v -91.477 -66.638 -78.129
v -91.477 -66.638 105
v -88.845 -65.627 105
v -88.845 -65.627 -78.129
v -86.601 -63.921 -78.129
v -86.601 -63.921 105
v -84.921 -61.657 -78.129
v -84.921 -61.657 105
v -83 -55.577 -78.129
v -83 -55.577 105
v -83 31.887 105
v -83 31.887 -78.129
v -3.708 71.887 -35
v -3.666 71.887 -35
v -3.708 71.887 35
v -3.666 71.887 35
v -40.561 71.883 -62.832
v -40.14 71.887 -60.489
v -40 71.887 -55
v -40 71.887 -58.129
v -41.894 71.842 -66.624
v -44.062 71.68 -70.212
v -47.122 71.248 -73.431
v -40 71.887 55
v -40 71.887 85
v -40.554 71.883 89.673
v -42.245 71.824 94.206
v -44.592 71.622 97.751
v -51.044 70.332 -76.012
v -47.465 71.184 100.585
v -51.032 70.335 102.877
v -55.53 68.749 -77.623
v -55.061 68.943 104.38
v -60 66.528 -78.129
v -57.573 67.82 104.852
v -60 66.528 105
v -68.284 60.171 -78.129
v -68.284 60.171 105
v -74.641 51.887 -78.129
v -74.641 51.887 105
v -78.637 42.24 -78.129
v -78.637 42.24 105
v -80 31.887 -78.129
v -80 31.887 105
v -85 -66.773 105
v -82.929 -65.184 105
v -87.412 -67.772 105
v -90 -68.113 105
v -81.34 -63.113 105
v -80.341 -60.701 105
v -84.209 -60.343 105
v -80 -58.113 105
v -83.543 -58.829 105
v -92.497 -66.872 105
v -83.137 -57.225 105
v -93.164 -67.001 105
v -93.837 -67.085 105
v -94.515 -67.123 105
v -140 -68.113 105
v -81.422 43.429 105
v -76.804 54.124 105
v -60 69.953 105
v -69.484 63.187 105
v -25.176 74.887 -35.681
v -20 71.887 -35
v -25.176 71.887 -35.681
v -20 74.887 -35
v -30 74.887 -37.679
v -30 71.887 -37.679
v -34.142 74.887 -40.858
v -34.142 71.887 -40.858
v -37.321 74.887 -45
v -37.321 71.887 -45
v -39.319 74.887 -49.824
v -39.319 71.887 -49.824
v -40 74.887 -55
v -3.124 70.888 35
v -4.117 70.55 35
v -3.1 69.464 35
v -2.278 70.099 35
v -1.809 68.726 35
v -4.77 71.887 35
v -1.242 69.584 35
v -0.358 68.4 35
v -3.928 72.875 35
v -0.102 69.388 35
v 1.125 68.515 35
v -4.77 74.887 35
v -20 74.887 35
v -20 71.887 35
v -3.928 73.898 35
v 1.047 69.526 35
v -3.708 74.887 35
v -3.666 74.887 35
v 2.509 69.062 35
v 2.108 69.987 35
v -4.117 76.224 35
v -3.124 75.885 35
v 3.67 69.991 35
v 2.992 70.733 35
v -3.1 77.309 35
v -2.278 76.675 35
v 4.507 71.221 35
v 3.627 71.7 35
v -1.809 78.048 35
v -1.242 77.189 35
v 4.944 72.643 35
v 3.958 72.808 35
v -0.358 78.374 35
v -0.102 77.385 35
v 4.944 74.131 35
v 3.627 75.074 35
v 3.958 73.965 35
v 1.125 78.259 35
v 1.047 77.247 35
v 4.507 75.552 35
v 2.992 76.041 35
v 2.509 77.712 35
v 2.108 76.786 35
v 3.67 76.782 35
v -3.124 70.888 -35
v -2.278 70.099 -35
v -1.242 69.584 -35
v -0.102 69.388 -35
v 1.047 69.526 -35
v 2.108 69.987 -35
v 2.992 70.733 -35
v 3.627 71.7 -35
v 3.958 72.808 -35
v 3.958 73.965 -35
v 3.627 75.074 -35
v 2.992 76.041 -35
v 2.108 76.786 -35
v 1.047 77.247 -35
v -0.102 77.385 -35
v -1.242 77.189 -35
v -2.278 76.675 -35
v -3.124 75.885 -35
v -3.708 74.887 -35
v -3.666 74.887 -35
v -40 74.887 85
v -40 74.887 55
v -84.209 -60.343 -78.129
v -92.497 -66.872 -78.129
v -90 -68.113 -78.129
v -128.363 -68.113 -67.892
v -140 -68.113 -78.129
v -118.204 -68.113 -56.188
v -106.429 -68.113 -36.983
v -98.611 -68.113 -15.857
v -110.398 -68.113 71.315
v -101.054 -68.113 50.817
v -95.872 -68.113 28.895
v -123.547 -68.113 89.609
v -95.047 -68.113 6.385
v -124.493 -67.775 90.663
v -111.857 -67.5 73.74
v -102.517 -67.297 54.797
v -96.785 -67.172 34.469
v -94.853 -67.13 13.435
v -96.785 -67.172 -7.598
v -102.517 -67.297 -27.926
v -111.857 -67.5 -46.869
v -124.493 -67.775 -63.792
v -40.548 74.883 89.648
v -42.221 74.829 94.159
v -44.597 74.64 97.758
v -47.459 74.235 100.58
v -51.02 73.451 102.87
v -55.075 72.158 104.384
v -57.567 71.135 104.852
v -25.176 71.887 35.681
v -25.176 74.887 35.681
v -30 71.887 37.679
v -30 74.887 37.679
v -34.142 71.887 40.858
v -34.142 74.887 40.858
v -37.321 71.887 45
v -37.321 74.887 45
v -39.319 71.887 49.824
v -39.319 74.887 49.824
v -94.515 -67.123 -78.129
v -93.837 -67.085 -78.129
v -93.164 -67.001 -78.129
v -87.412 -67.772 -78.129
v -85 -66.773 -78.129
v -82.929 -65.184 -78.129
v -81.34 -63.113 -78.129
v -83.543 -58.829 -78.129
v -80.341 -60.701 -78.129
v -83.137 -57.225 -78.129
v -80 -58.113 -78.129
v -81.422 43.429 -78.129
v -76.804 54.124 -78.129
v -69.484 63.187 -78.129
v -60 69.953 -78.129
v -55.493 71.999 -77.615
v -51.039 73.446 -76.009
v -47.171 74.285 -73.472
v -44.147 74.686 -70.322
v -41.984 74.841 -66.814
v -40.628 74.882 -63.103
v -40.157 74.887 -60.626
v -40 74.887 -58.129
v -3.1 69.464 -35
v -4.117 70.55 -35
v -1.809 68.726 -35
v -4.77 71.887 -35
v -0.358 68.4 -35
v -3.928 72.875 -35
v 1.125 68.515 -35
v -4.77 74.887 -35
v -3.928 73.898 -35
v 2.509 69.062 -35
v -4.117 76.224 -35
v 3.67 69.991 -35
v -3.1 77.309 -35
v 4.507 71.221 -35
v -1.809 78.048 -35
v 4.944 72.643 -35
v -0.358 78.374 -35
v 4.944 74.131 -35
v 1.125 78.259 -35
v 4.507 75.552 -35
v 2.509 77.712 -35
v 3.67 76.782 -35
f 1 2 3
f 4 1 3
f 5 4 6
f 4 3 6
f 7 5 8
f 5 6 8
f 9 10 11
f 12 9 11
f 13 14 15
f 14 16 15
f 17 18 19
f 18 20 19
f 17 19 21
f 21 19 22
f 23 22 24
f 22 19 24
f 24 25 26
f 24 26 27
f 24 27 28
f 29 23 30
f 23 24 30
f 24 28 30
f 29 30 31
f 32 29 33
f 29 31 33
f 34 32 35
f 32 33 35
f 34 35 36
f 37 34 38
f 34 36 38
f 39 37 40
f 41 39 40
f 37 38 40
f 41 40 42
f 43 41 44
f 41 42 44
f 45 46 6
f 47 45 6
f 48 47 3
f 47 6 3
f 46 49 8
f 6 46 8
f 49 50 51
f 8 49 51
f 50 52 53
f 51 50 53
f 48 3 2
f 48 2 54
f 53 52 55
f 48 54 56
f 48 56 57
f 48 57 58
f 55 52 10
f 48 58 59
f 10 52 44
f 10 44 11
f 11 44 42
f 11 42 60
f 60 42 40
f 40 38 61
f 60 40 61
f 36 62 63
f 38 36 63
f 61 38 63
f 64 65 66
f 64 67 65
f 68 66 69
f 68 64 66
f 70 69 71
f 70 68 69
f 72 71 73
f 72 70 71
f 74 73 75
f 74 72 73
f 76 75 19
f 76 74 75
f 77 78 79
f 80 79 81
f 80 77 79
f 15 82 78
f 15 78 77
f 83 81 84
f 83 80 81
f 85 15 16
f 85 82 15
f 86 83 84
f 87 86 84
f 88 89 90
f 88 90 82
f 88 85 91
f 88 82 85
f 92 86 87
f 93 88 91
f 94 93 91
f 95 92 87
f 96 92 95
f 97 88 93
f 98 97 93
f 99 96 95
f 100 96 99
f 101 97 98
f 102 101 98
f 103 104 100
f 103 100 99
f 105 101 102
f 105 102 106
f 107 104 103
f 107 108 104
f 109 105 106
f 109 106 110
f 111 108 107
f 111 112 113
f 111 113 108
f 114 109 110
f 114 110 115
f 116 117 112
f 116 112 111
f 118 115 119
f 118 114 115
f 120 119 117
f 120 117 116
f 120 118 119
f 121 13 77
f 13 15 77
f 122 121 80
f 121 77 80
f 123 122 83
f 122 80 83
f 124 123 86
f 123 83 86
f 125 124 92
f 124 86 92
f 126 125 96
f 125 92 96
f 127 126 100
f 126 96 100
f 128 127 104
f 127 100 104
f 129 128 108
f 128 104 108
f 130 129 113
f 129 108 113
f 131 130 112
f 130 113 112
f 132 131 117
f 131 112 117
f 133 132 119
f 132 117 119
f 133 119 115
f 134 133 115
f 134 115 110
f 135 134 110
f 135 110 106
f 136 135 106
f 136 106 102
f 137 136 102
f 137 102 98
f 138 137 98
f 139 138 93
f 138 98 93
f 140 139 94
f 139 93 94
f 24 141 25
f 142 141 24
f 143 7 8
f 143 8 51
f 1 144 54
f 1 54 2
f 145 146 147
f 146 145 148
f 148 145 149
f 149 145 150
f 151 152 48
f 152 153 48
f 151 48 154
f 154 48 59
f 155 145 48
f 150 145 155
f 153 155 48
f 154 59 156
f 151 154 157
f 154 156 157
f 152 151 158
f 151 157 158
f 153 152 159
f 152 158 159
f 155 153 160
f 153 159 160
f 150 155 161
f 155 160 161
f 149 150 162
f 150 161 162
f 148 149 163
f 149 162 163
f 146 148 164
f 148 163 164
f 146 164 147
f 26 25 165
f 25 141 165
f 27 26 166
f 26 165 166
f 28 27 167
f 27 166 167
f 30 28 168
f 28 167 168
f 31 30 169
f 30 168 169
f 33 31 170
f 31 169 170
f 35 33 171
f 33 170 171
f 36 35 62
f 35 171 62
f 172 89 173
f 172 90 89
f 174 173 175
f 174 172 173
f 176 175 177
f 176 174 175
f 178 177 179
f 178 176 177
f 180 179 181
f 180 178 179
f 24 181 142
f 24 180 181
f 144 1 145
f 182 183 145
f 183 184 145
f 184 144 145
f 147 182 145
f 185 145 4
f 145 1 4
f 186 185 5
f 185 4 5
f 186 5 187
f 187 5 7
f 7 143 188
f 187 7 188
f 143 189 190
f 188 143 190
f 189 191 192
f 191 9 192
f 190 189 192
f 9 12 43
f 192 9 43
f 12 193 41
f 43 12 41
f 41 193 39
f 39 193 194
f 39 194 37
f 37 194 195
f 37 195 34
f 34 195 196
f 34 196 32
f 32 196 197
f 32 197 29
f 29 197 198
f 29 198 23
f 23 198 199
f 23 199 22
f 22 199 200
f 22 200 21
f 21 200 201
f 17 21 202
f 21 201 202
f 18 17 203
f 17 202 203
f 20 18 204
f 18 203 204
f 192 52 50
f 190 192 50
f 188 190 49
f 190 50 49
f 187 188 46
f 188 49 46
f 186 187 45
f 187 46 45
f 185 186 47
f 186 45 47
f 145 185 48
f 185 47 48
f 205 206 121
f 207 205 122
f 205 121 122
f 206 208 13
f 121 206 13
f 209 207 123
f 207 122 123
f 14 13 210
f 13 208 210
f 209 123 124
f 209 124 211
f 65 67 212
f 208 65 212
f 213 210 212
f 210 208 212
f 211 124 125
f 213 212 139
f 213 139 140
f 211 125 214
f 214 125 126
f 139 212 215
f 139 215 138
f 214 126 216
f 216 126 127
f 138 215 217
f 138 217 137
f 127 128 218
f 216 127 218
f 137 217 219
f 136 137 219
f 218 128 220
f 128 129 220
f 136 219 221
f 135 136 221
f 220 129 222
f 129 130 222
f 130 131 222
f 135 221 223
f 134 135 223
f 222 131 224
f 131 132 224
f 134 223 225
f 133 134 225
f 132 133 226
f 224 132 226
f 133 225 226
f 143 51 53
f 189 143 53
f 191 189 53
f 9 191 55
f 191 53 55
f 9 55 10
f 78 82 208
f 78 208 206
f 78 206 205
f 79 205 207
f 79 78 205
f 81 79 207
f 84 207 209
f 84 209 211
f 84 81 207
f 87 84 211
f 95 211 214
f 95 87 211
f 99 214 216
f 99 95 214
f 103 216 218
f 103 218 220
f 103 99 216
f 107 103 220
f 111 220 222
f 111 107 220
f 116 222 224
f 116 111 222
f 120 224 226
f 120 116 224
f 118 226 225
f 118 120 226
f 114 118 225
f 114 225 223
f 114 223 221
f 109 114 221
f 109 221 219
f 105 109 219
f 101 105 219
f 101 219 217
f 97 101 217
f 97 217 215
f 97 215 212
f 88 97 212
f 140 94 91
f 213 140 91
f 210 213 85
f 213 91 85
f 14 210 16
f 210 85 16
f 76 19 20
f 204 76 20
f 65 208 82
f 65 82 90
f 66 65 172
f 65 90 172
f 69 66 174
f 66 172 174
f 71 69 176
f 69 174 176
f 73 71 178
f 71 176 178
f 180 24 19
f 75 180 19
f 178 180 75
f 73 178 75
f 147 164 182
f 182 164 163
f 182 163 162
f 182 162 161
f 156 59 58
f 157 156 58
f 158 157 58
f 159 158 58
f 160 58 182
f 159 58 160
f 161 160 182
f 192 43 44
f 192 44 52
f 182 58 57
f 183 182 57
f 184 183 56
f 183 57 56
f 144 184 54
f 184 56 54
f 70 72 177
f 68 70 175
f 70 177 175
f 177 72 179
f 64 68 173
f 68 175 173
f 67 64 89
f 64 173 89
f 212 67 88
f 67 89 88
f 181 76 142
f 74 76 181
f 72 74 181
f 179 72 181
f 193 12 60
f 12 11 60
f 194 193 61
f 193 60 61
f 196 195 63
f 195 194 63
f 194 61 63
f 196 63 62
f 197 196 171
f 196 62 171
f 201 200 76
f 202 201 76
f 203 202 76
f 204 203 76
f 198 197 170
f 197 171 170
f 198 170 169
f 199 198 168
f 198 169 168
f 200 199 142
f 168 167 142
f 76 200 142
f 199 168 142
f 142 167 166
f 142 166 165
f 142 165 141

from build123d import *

# Parameters (mm, degrees)
BOSS_EXTRUDE2_DEPTH = 105
SKETCH2_W           = 40
SKETCH2_H           = 70
CUT_EXTRUDE1_DEPTH  = 105
FILLET1_R           = 20
FILLET2_R           = 20
SKETCH3_R           = 5
SKETCH3_R_2         = 4
BOSS_EXTRUDE3_DEPTH = 70
SKETCH4_R           = 3.960689981
CUT_EXTRUDE2_DEPTH  = 70
SKETCH5_W           = 109.66717185
SKETCH5_H           = 31.212047829
CUT_EXTRUDE3_DEPTH  = 226.995575224
FILLET3_R           = 20
CUT_EXTRUDE4_DEPTH  = 228.140735518


with BuildPart() as part:
    # Sketch1 → Boss-Extrude2 (new, symmetric)
    with BuildSketch(Plane.XY):
        with BuildLine():
            Line((0, 71.886792453), (-40, 71.886792453))
            ThreePointArc((-40, 71.886792453), (-68.284271247, 60.1710637), (-80, 31.886792453))
            Line((-80, 31.886792453), (-80, -58.113207547))
            ThreePointArc((-80, -58.113207547), (-82.928932188, -65.184275359), (-90, -68.113207547))
            Line((-90, -68.113207547), (-140, -68.113207547))
            Line((-140, -68.113207547), (-94.515046268, -67.122597845))
            ThreePointArc((-94.515046268, -67.122597845), (-93.499760174, -67.04866017), (-92.497251559, -66.871885994))
            Line((-92.497251559, -66.871885994), (-91.47680263, -66.637838075))
            ThreePointArc((-91.47680263, -66.637838075), (-87.662546027, -64.853336369), (-84.921098336, -61.656859506))
            Line((-84.921098336, -61.656859506), (-84.208764192, -60.34289018))
            ThreePointArc((-84.208764192, -60.34289018), (-83.306900442, -58.035369732), (-83, -55.576951347))
            Line((-83, -55.576951347), (-83, 31.886792453))
            ThreePointArc((-83, 31.886792453), (-70.405591591, 62.292384044), (-40, 74.886792453))
            Line((-40, 74.886792453), (0, 74.886792453))
            Line((0, 74.886792453), (0, 71.886792453))
        make_face()
    extrude(amount=BOSS_EXTRUDE2_DEPTH, both=True)

    # Sketch2 → Cut-Extrude1 (cut, symmetric)
    with BuildSketch(Plane(origin=(0, 74.886792453, 0), x_dir=(1, 0, 0), z_dir=(0, 1, 0))):
        with Locations((-20, 70)):
            Rectangle(SKETCH2_W, SKETCH2_H)
        with Locations((-20, -70)):
            Rectangle(SKETCH2_W, SKETCH2_H)
    extrude(amount=CUT_EXTRUDE1_DEPTH, both=True, mode=Mode.SUBTRACT)

    # Fillet1
    fillet1_edges = [part.edges().sort_by_distance(p)[0] for p in [
        (-40, 73.386792453, -35),
        (-40, 73.386792453, 35),
    ]]
    fillet(fillet1_edges, radius=FILLET1_R)

    # Fillet2
    # the kernel refuses this fillet: 20 mm, written as the material it takes off along each edge
    with BuildSketch(Plane(origin=(-40, 21.886792453, -105), x_dir=(-1, 0, 0), z_dir=(0, 1, 0)), Plane(origin=(-40, 124.886792453, 105), x_dir=(-1, 0, 0), z_dir=(0, -1, 0))) as fillet2_piece_1:
        with BuildLine():
            CenterArc((FILLET2_R, FILLET2_R), FILLET2_R, 180, 90)
            Line((0, FILLET2_R), (0, 0))
            Line((0, 0), (FILLET2_R, 0))
        make_face()
    extrude(amount=103, mode=Mode.SUBTRACT)

    # Sketch3 → Boss-Extrude3 (add)
    with BuildSketch(Plane.XY.offset(35)):
        with Locations((0, 73.386792453)):
            Circle(SKETCH3_R)
        with Locations((0, 73.386792453)):
            Circle(SKETCH3_R_2, mode=Mode.SUBTRACT)
    extrude(amount=-BOSS_EXTRUDE3_DEPTH)

    # Sketch4 → Cut-Extrude2 (cut)
    with BuildSketch(Plane.XY.offset(35)):
        with Locations((0, 73.386792453)):
            Circle(SKETCH4_R)
    extrude(amount=-CUT_EXTRUDE2_DEPTH, mode=Mode.SUBTRACT)

    # Sketch5 → Cut-Extrude3 (cut, through all)
    with BuildSketch(Plane(origin=(0, 74.886792453, 0), x_dir=(1, 0, 0), z_dir=(0, 1, 0))):
        with Locations((-94.833585925, 93.735031647)):
            Rectangle(SKETCH5_W, SKETCH5_H)
    extrude(amount=-CUT_EXTRUDE3_DEPTH, mode=Mode.SUBTRACT)

    # Fillet3
    # the kernel refuses this fillet: 20 mm, written as the material it takes off along each edge
    with BuildSketch(Plane(origin=(-40, 124.886792453, -78.129007732), x_dir=(-1, 0, 0), z_dir=(0, -1, 0))) as fillet3_piece_1:
        with BuildLine():
            CenterArc((FILLET3_R, -FILLET3_R), FILLET3_R, 90, 90)
            Line((0, -FILLET3_R), (0, 0))
            Line((0, 0), (FILLET3_R, 0))
        make_face()
    extrude(amount=103, mode=Mode.SUBTRACT)

    # Sketch6 → Cut-Extrude4 (cut, through all)
    with BuildSketch(Plane(origin=(1.416350581, -65.033322939, 0), x_dir=(0.9997629253149604, 0.021773680572498965, 0), z_dir=(-0.021773680572498965, 0.9997629253149604, 0))):
        with BuildLine():
            Line((-141.449884768, 78.129007732), (-141.449884768, -105))
            ThreePointArc((-141.449884768, -105), (-96.291711515, -13.435496134), (-141.449884768, 78.129007732))
        make_face()
    extrude(amount=-CUT_EXTRUDE4_DEPTH, mode=Mode.SUBTRACT)


solid = part.part
